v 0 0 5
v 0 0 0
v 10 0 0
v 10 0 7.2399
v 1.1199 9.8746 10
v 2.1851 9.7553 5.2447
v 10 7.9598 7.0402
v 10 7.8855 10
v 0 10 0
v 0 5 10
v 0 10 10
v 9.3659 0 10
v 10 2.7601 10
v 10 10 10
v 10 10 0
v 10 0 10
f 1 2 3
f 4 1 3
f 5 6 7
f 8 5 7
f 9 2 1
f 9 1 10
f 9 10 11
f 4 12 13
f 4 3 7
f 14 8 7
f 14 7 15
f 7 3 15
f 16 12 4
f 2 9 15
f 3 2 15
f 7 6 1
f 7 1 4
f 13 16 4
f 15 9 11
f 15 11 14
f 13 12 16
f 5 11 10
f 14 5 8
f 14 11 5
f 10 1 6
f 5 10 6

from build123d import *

# Parameters (mm, degrees)
BOX001_W               = 10
BOX001_H               = 10
BOX001_DEPTH           = 10
BOX001_ROLL_ANGLE      = 1.436999
BOX001_PITCH_ANGLE     = -12.621416
BOX001_PLACEMENT_ANGLE = -12.939318
BOX_W                  = 10
BOX_H                  = 10
BOX_DEPTH              = 10


with BuildPart() as cube001:
    # Box001 → Box001 (new body)
    with BuildSketch(Plane.XY):
        with Locations((5, 5)):
            Rectangle(BOX001_W, BOX001_H)
    extrude(amount=BOX001_DEPTH)


with BuildPart() as cube001_1:
    # Box001 roll: moved
    add(cube001.part.rotate(Axis((0, 0, 0), (1, 0, 0)), BOX001_ROLL_ANGLE))


with BuildPart() as cube001_2:
    # Box001 pitch: moved
    add(cube001_1.part.rotate(Axis((0, 0, 0), (0, 1, 0)), BOX001_PITCH_ANGLE))


with BuildPart() as cube001_3:
    # Box001 placement: moved
    add(cube001_2.part.moved(Location((0, 0, 5))).rotate(Axis((0, 0, 5), (0, 0, 1)), BOX001_PLACEMENT_ANGLE))


with BuildPart() as cut:
    # Box → Box (new body)
    with BuildSketch(Plane.XY):
        with Locations((5, 5)):
            Rectangle(BOX_W, BOX_H)
    extrude(amount=BOX_DEPTH)

    # Cut: cut Cube001
    add(cube001_3.part, mode=Mode.SUBTRACT)


solid = cut.part
